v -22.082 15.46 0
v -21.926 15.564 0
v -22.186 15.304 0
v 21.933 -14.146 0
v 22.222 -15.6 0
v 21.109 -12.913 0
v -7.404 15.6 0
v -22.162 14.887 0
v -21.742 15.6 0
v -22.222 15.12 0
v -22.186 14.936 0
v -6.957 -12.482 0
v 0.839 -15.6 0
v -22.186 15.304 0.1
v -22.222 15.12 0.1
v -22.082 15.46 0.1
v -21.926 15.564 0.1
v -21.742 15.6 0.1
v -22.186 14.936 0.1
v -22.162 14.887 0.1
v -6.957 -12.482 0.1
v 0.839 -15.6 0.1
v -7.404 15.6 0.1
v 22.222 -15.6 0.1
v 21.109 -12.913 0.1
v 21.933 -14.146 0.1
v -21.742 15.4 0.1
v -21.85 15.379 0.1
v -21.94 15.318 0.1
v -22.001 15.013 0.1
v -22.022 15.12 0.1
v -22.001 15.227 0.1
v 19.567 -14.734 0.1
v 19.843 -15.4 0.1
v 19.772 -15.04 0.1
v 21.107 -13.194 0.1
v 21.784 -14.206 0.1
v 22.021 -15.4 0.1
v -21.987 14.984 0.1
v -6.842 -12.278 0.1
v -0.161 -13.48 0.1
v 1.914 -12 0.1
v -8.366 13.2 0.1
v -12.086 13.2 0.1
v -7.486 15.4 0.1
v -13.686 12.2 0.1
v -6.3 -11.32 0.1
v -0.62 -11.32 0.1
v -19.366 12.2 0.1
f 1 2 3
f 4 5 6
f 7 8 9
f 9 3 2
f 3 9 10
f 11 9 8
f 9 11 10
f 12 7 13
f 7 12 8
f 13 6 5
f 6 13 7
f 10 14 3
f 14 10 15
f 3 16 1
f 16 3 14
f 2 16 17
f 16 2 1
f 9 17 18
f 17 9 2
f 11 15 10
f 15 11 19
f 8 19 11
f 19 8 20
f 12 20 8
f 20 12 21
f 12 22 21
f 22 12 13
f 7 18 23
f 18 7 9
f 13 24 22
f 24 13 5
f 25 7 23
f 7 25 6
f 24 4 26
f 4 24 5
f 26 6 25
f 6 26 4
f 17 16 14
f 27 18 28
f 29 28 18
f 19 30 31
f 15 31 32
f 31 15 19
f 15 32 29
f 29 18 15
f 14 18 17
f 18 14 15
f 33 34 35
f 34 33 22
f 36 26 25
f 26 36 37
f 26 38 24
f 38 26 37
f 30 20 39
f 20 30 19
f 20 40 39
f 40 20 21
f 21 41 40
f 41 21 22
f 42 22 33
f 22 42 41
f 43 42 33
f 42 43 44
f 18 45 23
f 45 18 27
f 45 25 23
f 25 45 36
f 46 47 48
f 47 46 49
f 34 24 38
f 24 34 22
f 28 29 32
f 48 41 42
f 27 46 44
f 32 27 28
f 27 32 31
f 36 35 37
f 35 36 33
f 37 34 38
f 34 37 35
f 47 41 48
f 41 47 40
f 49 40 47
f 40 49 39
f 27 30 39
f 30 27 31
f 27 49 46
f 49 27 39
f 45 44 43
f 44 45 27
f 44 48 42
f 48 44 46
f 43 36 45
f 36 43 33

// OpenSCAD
use <../lib.scad>
use <169665a.scad>
function ldraw_lib__169655a() = [
// 0 =Sticker  3.9 x  5.6 with Black Space Shuttle Tail Lines Left Side
// 0 Name: 169655a.dat
// 0 Author: Chris Böhnke [KnightOfTarenta]
// 0 !LDRAW_ORG Part Alias UPDATE 2026-06
// 0 !LICENSE Licensed under CC BY 4.0 : see CAreadme.txt
// 
// 0 BFC CERTIFY CCW
  [0,"BFC","CERTIFY"],
  [0,"BFC","CCW"],
// 
// 0 !KEYWORDS Bricklink 6544stk01, Brickowl 420128, Launch Command
// 0 !KEYWORDS Rebrickable 169655, Set 6544, Shuttle Transcon 2, space port, town
// 
// 0 !HISTORY 2026-06-28 [OrionP] Official Update 2026-06
// 
// 1 16 0 0 0 1 0 0 0 1 0 0 0 1 169665a.dat
  [1,16,0,0,0,1,0,0,0,1,0,0,0,1, ldraw_lib__169665a()],
];
module ldraw_lib__169655a(step=0, col=false, unit=2/5, alt=false, line=0.2, solid=!$preview)
    makepoly(ldraw_lib__169655a(), step=step, col=col, unit=unit, alt=alt, line=line, solid=solid);
ldraw_lib__169655a(line=0.2);
